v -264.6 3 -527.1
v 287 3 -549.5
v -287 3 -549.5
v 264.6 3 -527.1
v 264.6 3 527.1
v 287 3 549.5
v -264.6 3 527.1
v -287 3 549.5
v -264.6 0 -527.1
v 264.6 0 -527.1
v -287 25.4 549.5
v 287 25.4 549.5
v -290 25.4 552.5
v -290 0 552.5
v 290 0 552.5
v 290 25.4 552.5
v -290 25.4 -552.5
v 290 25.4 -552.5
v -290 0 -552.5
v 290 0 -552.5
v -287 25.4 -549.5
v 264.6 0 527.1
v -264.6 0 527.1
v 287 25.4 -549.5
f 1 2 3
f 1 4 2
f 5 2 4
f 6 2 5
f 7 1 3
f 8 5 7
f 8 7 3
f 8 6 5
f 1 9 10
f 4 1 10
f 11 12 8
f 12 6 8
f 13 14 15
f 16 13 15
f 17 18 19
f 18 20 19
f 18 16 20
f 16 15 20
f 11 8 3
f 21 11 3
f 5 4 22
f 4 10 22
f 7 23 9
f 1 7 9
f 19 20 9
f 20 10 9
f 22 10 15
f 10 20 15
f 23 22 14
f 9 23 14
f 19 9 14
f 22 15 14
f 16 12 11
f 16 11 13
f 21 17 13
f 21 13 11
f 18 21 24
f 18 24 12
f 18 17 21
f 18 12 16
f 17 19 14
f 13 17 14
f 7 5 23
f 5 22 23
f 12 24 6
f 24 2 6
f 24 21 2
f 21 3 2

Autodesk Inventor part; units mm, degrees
ref_plane "YZ Plane" through (0, 0, 0) normal (1, 0, 0) x (0, 1, 0)
ref_plane "XZ Plane" through (0, 0, 0) normal (0, 1, 0) x (-1, 0, 0)
ref_plane "XY Plane" through (0, 0, 0) normal (0, 0, 1) x (1, 0, 0)
sketch "Sketch1" plane through (0, 0, 0) normal (0, 1, 0) x (-1, 0, 0)
  line L0 (-406, 0) -> (406, 0) construction
  line L1 (0, -773.5) -> (0, 773.5) construction
  line L2 (290, 552.5) -> (-290, 552.5)
  line L3 (-290, 552.5) -> (-290, -552.5)
  line L4 (-290, -552.5) -> (290, -552.5)
  line L5 (290, -552.5) -> (290, 552.5)
  line L6 (264.6, -527.1) -> (-264.6, -527.1)
  line L7 (-264.6, -527.1) -> (-264.6, 527.1)
  line L8 (-264.6, 527.1) -> (264.6, 527.1)
  line L9 (264.6, 527.1) -> (264.6, -527.1)
  point P0 (0, 0)
  dimension "d0" = 580
  dimension "d1" = 1105
  dimension "d8" = 25.4
  dimension "d9" = 25.4
extrude "Base thickness" add sketch "Sketch1" along normal blind 3
sketch "Sketch3" plane through (0, 3, 0) normal (0, 1, 0) x (1, 0, 0)
  line L0 (-290, 552.5) -> (-290, -552.5) projected
  line L1 (-290, -552.5) -> (290, -552.5) projected
  line L2 (290, -552.5) -> (290, 552.5) projected
  line L3 (290, 552.5) -> (-290, 552.5) projected
  line L4 (-290, 552.5) -> (-290, -552.5) projected
  line L5 (-287, 549.5) -> (287, 549.5)
  line L6 (287, 549.5) -> (287, -549.5)
  line L7 (287, -549.5) -> (-287, -549.5)
  line L8 (-287, -549.5) -> (-287, 549.5)
  line L9 (0, 773.5) -> (0, -773.5) construction
  line L10 (406, 0) -> (-406, 0) construction
  point P0 (0, 0)
  dimension "d14" = 3
  dimension "d15" = 3
extrude "Wall height" add sketch "Sketch3" along normal blind 22.4
equation "\"d8\" = angleSectionSize"
equation "\"d9\" = angleSectionSize"
equation "\"d12\" = wallThickness"
equation "\"d14\" = wallThickness"
equation "\"d15\" = wallThickness"
equation "\"d16\" = angleSectionSize - wallThickness"
equation "\"wallThickness\" = 3"
equation "\"angleSectionSize\" = 25.4"
properties part number "frame" material "Steel, Mild"
